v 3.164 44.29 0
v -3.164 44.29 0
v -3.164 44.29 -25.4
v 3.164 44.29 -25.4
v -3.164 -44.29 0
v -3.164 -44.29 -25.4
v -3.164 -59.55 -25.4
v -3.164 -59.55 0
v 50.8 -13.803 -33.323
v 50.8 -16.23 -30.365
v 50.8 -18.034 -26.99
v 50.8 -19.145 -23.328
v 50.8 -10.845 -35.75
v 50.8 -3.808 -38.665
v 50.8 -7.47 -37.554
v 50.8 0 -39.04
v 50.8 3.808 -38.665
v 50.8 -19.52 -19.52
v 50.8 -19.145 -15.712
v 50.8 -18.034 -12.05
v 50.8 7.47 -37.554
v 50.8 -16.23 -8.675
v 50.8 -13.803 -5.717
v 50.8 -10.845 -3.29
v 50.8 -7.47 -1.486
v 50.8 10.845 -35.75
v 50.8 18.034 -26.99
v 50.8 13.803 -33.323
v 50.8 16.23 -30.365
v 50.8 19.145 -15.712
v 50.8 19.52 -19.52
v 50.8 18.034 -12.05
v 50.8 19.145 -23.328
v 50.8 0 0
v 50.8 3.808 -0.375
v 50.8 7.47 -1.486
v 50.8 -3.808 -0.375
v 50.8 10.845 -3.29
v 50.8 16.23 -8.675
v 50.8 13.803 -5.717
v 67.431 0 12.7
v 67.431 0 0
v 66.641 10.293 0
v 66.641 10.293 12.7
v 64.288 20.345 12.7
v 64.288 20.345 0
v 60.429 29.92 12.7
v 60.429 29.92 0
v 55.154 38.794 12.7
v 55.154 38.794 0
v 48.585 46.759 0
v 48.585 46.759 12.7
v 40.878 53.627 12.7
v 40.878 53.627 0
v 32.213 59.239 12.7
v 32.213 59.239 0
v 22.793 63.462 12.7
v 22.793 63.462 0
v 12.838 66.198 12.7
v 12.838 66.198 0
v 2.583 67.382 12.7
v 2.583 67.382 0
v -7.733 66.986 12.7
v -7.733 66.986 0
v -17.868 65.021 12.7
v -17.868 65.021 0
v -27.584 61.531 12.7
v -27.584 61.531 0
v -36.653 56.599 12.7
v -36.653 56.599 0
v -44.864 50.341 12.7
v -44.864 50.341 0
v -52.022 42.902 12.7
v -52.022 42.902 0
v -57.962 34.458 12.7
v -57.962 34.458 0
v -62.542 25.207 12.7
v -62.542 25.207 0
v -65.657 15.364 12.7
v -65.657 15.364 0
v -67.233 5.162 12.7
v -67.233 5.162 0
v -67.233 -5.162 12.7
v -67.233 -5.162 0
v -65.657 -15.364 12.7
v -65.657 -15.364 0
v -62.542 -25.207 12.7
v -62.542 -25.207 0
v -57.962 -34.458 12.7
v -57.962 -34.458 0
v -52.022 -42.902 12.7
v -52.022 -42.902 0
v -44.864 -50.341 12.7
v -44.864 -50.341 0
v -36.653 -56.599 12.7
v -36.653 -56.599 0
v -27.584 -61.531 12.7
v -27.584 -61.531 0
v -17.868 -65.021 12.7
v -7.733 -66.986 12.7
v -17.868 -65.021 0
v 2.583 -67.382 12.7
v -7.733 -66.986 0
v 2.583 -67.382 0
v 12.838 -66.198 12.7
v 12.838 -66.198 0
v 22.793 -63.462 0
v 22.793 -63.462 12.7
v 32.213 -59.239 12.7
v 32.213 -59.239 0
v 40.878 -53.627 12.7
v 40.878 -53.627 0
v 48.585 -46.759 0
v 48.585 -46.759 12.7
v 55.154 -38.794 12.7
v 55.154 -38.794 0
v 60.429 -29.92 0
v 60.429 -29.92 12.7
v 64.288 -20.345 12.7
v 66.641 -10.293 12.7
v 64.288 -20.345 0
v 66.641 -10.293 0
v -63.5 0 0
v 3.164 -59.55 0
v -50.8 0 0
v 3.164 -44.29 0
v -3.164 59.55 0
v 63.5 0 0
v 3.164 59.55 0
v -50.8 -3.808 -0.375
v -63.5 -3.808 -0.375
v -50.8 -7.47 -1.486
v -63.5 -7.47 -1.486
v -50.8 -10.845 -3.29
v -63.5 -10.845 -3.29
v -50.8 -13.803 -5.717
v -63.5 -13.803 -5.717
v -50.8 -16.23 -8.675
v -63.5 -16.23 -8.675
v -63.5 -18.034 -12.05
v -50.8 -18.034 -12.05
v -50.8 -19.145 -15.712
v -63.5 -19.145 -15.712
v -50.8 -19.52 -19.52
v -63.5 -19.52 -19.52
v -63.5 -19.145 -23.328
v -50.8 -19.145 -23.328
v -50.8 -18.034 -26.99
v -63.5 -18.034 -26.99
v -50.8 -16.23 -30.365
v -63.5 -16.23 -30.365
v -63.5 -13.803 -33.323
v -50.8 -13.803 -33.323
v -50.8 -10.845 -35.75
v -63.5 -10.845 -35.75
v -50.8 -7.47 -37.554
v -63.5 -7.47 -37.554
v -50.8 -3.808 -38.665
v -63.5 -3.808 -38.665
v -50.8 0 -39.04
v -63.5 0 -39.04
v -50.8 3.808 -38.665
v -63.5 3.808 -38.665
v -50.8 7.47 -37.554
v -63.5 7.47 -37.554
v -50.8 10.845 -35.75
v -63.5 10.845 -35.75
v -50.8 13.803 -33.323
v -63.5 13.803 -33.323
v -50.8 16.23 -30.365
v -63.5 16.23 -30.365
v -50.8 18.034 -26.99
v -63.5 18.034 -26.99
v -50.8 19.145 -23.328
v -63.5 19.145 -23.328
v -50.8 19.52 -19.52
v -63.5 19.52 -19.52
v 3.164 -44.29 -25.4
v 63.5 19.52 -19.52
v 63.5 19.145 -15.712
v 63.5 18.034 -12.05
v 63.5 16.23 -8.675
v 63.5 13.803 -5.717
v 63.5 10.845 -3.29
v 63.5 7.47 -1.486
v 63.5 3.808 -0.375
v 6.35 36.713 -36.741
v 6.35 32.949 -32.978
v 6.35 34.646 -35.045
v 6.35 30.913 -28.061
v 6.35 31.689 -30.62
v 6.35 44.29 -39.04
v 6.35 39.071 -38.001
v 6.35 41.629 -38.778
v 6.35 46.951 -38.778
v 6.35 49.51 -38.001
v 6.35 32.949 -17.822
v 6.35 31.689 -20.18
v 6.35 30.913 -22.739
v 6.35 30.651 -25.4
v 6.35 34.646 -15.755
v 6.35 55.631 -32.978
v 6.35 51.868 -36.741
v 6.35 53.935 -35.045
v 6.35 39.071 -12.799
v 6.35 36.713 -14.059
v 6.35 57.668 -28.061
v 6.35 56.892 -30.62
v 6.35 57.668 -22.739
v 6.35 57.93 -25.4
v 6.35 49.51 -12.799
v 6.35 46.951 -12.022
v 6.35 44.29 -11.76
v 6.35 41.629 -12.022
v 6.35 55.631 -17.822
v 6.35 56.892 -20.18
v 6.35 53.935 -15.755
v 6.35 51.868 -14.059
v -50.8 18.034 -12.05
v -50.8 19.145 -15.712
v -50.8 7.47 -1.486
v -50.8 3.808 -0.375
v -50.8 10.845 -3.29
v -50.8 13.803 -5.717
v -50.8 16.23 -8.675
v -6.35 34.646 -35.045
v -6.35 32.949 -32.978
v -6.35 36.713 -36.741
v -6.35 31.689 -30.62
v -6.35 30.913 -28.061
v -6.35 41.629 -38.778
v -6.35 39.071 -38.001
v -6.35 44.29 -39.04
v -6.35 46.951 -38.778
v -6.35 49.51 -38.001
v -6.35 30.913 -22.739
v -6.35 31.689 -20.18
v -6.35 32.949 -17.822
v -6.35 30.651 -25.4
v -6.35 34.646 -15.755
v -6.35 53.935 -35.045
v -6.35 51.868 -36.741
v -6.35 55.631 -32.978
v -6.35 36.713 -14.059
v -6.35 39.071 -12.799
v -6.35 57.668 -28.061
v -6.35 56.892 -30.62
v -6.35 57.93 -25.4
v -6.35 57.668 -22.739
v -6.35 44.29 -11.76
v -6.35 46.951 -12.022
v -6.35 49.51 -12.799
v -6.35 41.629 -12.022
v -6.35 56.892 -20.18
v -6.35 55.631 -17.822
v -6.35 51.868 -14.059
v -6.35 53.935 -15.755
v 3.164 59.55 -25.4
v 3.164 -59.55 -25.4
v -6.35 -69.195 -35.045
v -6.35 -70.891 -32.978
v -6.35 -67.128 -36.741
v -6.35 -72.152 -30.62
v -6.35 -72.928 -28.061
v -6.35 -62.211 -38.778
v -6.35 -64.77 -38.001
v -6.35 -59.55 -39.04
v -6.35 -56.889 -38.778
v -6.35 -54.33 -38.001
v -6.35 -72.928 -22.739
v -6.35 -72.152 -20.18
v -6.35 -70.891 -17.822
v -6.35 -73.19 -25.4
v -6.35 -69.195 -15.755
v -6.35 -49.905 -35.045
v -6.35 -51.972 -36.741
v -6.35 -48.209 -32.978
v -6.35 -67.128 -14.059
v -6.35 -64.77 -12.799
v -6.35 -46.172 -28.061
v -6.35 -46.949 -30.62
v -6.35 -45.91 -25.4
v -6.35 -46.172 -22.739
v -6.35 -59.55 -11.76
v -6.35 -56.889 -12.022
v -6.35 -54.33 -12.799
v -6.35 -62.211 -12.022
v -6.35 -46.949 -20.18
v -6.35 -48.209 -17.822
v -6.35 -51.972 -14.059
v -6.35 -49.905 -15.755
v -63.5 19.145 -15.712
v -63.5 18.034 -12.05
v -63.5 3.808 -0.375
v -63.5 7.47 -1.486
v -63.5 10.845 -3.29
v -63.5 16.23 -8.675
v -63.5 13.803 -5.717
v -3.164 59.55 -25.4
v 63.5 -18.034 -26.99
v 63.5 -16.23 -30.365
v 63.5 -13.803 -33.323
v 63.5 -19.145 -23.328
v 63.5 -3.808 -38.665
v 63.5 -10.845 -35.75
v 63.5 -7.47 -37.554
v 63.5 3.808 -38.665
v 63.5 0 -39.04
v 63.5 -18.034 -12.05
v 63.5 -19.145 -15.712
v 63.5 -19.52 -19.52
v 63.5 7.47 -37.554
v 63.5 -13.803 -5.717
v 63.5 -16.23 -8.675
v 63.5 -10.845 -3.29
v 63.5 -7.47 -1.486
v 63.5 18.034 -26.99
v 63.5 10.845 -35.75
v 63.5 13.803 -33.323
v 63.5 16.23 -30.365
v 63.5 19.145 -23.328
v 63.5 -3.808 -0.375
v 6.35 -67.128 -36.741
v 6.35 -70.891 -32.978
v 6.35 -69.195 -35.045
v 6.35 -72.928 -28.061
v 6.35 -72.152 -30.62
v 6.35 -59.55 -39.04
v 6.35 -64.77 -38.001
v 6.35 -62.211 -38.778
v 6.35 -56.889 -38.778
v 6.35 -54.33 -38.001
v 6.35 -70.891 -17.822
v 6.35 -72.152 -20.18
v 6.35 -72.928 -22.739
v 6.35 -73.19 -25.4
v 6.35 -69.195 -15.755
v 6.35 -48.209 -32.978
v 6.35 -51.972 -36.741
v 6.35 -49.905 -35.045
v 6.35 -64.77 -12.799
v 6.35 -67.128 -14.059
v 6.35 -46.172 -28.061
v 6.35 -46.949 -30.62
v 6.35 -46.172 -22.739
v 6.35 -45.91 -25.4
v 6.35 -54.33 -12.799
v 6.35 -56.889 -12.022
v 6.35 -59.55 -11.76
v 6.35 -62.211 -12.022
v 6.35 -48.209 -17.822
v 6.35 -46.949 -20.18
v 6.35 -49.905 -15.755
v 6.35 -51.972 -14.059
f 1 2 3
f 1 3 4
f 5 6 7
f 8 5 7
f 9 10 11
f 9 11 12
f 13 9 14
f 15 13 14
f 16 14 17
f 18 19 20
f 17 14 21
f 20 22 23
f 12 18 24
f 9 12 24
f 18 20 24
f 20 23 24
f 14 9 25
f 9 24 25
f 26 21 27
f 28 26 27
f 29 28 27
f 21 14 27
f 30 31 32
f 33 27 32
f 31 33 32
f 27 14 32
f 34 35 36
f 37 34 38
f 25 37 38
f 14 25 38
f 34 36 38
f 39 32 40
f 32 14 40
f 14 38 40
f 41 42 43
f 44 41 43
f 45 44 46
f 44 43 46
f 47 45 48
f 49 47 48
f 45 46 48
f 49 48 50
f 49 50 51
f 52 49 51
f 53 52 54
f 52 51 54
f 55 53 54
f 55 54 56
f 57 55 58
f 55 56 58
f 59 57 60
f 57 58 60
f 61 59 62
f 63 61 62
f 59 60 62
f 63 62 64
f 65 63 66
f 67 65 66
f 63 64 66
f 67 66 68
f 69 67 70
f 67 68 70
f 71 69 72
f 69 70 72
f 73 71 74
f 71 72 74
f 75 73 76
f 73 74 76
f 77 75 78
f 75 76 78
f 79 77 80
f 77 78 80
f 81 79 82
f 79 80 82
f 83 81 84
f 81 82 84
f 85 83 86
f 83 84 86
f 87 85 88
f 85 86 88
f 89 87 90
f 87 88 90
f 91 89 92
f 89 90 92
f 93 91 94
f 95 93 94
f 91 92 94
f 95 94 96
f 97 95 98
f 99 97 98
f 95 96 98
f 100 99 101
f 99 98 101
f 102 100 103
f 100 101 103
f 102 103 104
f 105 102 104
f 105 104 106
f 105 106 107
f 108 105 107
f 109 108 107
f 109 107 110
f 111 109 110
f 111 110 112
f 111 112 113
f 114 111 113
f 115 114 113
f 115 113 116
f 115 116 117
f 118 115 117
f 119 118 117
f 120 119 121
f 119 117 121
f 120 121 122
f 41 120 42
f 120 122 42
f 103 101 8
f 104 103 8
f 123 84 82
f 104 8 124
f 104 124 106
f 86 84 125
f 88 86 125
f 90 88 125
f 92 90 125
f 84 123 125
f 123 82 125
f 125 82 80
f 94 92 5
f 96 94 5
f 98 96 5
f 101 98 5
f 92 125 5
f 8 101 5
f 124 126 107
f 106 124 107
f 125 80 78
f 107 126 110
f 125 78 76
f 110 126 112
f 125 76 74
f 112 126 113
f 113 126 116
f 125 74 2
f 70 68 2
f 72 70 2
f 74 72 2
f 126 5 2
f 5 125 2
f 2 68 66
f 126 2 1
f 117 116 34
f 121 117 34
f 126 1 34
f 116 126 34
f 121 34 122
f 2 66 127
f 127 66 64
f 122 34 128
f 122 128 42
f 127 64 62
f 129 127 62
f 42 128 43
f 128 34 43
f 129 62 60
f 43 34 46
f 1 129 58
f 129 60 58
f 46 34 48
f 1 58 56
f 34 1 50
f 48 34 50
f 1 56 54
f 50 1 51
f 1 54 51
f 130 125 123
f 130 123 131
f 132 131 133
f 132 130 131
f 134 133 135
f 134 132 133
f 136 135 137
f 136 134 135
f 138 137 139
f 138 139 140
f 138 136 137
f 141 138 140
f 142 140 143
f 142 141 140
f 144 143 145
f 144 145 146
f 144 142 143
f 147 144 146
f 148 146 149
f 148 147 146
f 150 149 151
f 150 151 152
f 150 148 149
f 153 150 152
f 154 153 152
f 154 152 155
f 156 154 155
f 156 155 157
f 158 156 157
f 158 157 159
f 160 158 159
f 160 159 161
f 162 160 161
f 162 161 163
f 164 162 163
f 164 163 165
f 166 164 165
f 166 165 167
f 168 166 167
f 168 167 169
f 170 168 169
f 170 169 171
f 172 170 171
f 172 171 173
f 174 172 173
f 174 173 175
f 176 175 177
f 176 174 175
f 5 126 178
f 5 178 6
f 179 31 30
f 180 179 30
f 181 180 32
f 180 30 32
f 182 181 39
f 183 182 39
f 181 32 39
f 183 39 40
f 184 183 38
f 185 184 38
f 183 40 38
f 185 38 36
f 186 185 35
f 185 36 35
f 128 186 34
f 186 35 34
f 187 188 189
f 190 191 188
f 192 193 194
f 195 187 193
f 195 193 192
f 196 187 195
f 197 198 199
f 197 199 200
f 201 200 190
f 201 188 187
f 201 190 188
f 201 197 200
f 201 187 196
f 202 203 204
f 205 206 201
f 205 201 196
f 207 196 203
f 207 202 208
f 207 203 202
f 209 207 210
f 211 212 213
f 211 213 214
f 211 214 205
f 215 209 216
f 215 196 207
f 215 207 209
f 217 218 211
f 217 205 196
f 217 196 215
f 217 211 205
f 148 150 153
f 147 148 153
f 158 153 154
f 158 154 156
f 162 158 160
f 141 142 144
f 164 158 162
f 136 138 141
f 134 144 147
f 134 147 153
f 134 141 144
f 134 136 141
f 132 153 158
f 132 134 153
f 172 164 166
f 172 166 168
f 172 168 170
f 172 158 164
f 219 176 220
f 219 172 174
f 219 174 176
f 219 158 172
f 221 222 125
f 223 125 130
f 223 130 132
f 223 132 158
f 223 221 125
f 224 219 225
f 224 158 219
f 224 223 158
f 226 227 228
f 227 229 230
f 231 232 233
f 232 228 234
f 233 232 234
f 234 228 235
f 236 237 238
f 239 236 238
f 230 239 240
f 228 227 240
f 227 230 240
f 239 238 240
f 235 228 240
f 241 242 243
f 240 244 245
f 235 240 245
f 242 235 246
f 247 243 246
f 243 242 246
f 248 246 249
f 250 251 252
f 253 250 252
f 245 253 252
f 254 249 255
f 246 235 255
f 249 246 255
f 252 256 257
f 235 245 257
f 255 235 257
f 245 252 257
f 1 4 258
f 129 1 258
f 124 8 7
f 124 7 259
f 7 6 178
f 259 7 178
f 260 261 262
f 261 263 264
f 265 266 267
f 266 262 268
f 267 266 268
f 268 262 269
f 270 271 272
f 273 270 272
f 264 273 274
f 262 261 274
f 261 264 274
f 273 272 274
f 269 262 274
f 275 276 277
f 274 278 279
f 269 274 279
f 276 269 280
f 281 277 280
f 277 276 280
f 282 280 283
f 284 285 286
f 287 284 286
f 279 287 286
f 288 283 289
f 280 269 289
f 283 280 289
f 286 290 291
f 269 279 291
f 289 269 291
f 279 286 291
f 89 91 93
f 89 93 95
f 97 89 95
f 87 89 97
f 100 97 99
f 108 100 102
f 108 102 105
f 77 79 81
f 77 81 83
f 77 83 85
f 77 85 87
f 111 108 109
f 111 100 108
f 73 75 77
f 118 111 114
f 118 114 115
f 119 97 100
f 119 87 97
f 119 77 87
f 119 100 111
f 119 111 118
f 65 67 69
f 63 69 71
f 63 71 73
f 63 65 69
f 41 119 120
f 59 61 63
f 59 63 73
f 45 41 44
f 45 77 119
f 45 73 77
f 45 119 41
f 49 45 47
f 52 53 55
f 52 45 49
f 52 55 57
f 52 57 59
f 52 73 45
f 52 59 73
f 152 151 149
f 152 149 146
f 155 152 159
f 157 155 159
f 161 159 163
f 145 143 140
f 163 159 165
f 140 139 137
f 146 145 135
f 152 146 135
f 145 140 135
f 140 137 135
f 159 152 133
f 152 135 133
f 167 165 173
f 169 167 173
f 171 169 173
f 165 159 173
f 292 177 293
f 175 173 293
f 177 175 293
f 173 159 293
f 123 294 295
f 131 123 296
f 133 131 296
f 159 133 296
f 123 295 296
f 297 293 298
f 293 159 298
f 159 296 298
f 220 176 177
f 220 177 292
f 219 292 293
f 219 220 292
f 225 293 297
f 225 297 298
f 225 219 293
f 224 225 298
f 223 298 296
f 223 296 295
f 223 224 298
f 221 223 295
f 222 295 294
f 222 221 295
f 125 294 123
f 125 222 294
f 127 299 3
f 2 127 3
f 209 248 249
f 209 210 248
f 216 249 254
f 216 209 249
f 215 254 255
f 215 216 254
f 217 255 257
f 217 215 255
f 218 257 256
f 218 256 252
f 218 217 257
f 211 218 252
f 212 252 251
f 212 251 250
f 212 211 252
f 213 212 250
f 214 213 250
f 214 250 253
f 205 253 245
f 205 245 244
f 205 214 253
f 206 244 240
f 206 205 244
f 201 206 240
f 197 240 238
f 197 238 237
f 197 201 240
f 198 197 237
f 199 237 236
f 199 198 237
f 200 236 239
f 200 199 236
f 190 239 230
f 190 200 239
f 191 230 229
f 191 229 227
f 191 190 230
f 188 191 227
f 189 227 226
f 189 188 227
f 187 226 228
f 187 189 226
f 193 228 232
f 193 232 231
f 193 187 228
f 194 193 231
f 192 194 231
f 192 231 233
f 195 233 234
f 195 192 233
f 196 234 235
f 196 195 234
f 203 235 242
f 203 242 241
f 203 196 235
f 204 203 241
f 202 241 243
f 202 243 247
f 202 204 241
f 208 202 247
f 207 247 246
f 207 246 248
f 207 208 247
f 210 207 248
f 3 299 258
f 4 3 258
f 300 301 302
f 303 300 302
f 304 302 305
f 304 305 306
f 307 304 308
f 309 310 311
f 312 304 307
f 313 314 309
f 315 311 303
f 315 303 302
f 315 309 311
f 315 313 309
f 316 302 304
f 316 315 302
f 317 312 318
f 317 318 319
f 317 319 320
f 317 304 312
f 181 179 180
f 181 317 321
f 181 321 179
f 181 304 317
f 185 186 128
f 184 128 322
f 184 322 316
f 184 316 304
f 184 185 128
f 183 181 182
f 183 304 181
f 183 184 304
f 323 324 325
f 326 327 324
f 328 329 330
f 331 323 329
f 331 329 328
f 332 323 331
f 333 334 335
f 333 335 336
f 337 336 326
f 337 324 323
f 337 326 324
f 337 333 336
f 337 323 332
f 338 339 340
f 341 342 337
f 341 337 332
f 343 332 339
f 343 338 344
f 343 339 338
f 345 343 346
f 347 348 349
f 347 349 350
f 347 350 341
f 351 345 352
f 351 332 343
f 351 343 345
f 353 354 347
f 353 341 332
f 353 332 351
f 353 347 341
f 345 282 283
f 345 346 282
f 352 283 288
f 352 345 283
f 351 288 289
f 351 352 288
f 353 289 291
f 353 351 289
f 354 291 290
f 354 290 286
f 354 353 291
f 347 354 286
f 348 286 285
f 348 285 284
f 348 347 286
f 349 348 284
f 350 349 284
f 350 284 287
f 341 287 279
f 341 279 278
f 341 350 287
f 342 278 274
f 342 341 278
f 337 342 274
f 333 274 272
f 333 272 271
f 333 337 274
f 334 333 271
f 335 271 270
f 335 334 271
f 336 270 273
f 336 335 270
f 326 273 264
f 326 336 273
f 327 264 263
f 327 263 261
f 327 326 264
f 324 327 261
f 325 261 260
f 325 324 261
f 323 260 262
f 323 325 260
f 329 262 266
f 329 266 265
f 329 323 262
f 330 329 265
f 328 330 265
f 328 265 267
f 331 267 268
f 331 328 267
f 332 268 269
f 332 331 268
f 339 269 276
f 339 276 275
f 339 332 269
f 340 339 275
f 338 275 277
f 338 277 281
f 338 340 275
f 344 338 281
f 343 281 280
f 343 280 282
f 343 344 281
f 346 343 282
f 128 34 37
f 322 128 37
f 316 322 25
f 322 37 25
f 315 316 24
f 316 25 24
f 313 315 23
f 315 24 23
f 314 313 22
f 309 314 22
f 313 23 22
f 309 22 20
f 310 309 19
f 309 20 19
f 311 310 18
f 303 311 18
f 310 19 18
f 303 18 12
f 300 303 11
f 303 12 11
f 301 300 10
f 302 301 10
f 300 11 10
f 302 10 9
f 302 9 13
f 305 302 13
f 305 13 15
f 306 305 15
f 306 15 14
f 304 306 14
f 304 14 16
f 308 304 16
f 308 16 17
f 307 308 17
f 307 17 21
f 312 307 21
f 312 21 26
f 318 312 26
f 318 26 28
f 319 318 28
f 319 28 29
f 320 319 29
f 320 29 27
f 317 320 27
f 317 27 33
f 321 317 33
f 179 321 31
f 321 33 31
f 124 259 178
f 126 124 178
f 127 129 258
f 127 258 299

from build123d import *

# Parameters (mm, degrees)
F0_R          = 67.4309942843
F1_DEPTH      = 12.7
F2_DEPTH      = 25.4
F4_START      = 50.8
F3_R          = 19.5198711008
F4_DEPTH      = 12.7
F5_START      = -50.8
F5_DEPTH      = 12.7
F3_R_2        = 13.6397422016
F6_DEPTH      = 6.35
F6_DEPTH_BACK = 6.35


with BuildPart() as f1:
    # F0 (on Top) → F1 (new body)
    with BuildSketch(Plane.XY):
        Circle(F0_R)
        Polygon((3.1635994092, -44.2903488874), (3.1635994092, -59.5500506461), (0, -59.5500506461), (-3.1635994092, -59.5500506461), (-3.1635994092, -44.2903488874), (0, -44.2903488874), align=None, mode=Mode.SUBTRACT)
        Polygon((-3.1635994092, 44.2903488874), (-3.1635994092, 59.5500506461), (0, 59.5500506461), (3.1635994092, 59.5500506461), (3.1635994092, 44.2903488874), (0, 44.2903488874), align=None, mode=Mode.SUBTRACT)
        Polygon((0, 59.5500506461), (-3.1635994092, 59.5500506461), (-3.1635994092, 44.2903488874), (0, 44.2903488874), (3.1635994092, 44.2903488874), (3.1635994092, 59.5500506461), align=None)
        Polygon((0, -59.5500506461), (3.1635994092, -59.5500506461), (3.1635994092, -44.2903488874), (0, -44.2903488874), (-3.1635994092, -44.2903488874), (-3.1635994092, -59.5500506461), align=None)
    extrude(amount=F1_DEPTH)

    # F0 (on Top) → F2 (join)
    with BuildSketch(Plane.XY):
        Polygon((0, -59.5500506461), (3.1635994092, -59.5500506461), (3.1635994092, -44.2903488874), (0, -44.2903488874), (-3.1635994092, -44.2903488874), (-3.1635994092, -59.5500506461), align=None)
        Polygon((0, 59.5500506461), (-3.1635994092, 59.5500506461), (-3.1635994092, 44.2903488874), (0, 44.2903488874), (3.1635994092, 44.2903488874), (3.1635994092, 59.5500506461), align=None)
    extrude(amount=-F2_DEPTH)

    # F3 (on Right) → F4 (join)
    with BuildSketch(Plane.YZ.offset(F4_START)):
        with Locations((0, -19.5198711008)):
            Circle(F3_R)
    extrude(amount=F4_DEPTH)

    # F3 (on Right) → F5 (join)
    with BuildSketch(Plane.YZ.offset(F5_START)):
        with Locations((0, -19.5198711008)):
            Circle(F3_R)
    extrude(amount=-F5_DEPTH)


with BuildPart() as f6:
    # F3 (on Right) → F6 (new body, two sides)
    with BuildSketch(Plane.YZ) as f6_sk:
        with Locations((-59.5500506461, -25.4)):
            Circle(F3_R_2)
    extrude(amount=F6_DEPTH)
    extrude(f6_sk.sketch, amount=-F6_DEPTH_BACK)


with BuildPart() as f6b:
    # F3 (on Right) → F6, piece 2 (new body, two sides)
    with BuildSketch(Plane.YZ) as f6_2_sk:
        with Locations((44.2903488874, -25.4)):
            Circle(F3_R_2)
    extrude(amount=F6_DEPTH)
    extrude(f6_2_sk.sketch, amount=-F6_DEPTH_BACK)


solid = Compound([f1.part, f6.part, f6b.part])
